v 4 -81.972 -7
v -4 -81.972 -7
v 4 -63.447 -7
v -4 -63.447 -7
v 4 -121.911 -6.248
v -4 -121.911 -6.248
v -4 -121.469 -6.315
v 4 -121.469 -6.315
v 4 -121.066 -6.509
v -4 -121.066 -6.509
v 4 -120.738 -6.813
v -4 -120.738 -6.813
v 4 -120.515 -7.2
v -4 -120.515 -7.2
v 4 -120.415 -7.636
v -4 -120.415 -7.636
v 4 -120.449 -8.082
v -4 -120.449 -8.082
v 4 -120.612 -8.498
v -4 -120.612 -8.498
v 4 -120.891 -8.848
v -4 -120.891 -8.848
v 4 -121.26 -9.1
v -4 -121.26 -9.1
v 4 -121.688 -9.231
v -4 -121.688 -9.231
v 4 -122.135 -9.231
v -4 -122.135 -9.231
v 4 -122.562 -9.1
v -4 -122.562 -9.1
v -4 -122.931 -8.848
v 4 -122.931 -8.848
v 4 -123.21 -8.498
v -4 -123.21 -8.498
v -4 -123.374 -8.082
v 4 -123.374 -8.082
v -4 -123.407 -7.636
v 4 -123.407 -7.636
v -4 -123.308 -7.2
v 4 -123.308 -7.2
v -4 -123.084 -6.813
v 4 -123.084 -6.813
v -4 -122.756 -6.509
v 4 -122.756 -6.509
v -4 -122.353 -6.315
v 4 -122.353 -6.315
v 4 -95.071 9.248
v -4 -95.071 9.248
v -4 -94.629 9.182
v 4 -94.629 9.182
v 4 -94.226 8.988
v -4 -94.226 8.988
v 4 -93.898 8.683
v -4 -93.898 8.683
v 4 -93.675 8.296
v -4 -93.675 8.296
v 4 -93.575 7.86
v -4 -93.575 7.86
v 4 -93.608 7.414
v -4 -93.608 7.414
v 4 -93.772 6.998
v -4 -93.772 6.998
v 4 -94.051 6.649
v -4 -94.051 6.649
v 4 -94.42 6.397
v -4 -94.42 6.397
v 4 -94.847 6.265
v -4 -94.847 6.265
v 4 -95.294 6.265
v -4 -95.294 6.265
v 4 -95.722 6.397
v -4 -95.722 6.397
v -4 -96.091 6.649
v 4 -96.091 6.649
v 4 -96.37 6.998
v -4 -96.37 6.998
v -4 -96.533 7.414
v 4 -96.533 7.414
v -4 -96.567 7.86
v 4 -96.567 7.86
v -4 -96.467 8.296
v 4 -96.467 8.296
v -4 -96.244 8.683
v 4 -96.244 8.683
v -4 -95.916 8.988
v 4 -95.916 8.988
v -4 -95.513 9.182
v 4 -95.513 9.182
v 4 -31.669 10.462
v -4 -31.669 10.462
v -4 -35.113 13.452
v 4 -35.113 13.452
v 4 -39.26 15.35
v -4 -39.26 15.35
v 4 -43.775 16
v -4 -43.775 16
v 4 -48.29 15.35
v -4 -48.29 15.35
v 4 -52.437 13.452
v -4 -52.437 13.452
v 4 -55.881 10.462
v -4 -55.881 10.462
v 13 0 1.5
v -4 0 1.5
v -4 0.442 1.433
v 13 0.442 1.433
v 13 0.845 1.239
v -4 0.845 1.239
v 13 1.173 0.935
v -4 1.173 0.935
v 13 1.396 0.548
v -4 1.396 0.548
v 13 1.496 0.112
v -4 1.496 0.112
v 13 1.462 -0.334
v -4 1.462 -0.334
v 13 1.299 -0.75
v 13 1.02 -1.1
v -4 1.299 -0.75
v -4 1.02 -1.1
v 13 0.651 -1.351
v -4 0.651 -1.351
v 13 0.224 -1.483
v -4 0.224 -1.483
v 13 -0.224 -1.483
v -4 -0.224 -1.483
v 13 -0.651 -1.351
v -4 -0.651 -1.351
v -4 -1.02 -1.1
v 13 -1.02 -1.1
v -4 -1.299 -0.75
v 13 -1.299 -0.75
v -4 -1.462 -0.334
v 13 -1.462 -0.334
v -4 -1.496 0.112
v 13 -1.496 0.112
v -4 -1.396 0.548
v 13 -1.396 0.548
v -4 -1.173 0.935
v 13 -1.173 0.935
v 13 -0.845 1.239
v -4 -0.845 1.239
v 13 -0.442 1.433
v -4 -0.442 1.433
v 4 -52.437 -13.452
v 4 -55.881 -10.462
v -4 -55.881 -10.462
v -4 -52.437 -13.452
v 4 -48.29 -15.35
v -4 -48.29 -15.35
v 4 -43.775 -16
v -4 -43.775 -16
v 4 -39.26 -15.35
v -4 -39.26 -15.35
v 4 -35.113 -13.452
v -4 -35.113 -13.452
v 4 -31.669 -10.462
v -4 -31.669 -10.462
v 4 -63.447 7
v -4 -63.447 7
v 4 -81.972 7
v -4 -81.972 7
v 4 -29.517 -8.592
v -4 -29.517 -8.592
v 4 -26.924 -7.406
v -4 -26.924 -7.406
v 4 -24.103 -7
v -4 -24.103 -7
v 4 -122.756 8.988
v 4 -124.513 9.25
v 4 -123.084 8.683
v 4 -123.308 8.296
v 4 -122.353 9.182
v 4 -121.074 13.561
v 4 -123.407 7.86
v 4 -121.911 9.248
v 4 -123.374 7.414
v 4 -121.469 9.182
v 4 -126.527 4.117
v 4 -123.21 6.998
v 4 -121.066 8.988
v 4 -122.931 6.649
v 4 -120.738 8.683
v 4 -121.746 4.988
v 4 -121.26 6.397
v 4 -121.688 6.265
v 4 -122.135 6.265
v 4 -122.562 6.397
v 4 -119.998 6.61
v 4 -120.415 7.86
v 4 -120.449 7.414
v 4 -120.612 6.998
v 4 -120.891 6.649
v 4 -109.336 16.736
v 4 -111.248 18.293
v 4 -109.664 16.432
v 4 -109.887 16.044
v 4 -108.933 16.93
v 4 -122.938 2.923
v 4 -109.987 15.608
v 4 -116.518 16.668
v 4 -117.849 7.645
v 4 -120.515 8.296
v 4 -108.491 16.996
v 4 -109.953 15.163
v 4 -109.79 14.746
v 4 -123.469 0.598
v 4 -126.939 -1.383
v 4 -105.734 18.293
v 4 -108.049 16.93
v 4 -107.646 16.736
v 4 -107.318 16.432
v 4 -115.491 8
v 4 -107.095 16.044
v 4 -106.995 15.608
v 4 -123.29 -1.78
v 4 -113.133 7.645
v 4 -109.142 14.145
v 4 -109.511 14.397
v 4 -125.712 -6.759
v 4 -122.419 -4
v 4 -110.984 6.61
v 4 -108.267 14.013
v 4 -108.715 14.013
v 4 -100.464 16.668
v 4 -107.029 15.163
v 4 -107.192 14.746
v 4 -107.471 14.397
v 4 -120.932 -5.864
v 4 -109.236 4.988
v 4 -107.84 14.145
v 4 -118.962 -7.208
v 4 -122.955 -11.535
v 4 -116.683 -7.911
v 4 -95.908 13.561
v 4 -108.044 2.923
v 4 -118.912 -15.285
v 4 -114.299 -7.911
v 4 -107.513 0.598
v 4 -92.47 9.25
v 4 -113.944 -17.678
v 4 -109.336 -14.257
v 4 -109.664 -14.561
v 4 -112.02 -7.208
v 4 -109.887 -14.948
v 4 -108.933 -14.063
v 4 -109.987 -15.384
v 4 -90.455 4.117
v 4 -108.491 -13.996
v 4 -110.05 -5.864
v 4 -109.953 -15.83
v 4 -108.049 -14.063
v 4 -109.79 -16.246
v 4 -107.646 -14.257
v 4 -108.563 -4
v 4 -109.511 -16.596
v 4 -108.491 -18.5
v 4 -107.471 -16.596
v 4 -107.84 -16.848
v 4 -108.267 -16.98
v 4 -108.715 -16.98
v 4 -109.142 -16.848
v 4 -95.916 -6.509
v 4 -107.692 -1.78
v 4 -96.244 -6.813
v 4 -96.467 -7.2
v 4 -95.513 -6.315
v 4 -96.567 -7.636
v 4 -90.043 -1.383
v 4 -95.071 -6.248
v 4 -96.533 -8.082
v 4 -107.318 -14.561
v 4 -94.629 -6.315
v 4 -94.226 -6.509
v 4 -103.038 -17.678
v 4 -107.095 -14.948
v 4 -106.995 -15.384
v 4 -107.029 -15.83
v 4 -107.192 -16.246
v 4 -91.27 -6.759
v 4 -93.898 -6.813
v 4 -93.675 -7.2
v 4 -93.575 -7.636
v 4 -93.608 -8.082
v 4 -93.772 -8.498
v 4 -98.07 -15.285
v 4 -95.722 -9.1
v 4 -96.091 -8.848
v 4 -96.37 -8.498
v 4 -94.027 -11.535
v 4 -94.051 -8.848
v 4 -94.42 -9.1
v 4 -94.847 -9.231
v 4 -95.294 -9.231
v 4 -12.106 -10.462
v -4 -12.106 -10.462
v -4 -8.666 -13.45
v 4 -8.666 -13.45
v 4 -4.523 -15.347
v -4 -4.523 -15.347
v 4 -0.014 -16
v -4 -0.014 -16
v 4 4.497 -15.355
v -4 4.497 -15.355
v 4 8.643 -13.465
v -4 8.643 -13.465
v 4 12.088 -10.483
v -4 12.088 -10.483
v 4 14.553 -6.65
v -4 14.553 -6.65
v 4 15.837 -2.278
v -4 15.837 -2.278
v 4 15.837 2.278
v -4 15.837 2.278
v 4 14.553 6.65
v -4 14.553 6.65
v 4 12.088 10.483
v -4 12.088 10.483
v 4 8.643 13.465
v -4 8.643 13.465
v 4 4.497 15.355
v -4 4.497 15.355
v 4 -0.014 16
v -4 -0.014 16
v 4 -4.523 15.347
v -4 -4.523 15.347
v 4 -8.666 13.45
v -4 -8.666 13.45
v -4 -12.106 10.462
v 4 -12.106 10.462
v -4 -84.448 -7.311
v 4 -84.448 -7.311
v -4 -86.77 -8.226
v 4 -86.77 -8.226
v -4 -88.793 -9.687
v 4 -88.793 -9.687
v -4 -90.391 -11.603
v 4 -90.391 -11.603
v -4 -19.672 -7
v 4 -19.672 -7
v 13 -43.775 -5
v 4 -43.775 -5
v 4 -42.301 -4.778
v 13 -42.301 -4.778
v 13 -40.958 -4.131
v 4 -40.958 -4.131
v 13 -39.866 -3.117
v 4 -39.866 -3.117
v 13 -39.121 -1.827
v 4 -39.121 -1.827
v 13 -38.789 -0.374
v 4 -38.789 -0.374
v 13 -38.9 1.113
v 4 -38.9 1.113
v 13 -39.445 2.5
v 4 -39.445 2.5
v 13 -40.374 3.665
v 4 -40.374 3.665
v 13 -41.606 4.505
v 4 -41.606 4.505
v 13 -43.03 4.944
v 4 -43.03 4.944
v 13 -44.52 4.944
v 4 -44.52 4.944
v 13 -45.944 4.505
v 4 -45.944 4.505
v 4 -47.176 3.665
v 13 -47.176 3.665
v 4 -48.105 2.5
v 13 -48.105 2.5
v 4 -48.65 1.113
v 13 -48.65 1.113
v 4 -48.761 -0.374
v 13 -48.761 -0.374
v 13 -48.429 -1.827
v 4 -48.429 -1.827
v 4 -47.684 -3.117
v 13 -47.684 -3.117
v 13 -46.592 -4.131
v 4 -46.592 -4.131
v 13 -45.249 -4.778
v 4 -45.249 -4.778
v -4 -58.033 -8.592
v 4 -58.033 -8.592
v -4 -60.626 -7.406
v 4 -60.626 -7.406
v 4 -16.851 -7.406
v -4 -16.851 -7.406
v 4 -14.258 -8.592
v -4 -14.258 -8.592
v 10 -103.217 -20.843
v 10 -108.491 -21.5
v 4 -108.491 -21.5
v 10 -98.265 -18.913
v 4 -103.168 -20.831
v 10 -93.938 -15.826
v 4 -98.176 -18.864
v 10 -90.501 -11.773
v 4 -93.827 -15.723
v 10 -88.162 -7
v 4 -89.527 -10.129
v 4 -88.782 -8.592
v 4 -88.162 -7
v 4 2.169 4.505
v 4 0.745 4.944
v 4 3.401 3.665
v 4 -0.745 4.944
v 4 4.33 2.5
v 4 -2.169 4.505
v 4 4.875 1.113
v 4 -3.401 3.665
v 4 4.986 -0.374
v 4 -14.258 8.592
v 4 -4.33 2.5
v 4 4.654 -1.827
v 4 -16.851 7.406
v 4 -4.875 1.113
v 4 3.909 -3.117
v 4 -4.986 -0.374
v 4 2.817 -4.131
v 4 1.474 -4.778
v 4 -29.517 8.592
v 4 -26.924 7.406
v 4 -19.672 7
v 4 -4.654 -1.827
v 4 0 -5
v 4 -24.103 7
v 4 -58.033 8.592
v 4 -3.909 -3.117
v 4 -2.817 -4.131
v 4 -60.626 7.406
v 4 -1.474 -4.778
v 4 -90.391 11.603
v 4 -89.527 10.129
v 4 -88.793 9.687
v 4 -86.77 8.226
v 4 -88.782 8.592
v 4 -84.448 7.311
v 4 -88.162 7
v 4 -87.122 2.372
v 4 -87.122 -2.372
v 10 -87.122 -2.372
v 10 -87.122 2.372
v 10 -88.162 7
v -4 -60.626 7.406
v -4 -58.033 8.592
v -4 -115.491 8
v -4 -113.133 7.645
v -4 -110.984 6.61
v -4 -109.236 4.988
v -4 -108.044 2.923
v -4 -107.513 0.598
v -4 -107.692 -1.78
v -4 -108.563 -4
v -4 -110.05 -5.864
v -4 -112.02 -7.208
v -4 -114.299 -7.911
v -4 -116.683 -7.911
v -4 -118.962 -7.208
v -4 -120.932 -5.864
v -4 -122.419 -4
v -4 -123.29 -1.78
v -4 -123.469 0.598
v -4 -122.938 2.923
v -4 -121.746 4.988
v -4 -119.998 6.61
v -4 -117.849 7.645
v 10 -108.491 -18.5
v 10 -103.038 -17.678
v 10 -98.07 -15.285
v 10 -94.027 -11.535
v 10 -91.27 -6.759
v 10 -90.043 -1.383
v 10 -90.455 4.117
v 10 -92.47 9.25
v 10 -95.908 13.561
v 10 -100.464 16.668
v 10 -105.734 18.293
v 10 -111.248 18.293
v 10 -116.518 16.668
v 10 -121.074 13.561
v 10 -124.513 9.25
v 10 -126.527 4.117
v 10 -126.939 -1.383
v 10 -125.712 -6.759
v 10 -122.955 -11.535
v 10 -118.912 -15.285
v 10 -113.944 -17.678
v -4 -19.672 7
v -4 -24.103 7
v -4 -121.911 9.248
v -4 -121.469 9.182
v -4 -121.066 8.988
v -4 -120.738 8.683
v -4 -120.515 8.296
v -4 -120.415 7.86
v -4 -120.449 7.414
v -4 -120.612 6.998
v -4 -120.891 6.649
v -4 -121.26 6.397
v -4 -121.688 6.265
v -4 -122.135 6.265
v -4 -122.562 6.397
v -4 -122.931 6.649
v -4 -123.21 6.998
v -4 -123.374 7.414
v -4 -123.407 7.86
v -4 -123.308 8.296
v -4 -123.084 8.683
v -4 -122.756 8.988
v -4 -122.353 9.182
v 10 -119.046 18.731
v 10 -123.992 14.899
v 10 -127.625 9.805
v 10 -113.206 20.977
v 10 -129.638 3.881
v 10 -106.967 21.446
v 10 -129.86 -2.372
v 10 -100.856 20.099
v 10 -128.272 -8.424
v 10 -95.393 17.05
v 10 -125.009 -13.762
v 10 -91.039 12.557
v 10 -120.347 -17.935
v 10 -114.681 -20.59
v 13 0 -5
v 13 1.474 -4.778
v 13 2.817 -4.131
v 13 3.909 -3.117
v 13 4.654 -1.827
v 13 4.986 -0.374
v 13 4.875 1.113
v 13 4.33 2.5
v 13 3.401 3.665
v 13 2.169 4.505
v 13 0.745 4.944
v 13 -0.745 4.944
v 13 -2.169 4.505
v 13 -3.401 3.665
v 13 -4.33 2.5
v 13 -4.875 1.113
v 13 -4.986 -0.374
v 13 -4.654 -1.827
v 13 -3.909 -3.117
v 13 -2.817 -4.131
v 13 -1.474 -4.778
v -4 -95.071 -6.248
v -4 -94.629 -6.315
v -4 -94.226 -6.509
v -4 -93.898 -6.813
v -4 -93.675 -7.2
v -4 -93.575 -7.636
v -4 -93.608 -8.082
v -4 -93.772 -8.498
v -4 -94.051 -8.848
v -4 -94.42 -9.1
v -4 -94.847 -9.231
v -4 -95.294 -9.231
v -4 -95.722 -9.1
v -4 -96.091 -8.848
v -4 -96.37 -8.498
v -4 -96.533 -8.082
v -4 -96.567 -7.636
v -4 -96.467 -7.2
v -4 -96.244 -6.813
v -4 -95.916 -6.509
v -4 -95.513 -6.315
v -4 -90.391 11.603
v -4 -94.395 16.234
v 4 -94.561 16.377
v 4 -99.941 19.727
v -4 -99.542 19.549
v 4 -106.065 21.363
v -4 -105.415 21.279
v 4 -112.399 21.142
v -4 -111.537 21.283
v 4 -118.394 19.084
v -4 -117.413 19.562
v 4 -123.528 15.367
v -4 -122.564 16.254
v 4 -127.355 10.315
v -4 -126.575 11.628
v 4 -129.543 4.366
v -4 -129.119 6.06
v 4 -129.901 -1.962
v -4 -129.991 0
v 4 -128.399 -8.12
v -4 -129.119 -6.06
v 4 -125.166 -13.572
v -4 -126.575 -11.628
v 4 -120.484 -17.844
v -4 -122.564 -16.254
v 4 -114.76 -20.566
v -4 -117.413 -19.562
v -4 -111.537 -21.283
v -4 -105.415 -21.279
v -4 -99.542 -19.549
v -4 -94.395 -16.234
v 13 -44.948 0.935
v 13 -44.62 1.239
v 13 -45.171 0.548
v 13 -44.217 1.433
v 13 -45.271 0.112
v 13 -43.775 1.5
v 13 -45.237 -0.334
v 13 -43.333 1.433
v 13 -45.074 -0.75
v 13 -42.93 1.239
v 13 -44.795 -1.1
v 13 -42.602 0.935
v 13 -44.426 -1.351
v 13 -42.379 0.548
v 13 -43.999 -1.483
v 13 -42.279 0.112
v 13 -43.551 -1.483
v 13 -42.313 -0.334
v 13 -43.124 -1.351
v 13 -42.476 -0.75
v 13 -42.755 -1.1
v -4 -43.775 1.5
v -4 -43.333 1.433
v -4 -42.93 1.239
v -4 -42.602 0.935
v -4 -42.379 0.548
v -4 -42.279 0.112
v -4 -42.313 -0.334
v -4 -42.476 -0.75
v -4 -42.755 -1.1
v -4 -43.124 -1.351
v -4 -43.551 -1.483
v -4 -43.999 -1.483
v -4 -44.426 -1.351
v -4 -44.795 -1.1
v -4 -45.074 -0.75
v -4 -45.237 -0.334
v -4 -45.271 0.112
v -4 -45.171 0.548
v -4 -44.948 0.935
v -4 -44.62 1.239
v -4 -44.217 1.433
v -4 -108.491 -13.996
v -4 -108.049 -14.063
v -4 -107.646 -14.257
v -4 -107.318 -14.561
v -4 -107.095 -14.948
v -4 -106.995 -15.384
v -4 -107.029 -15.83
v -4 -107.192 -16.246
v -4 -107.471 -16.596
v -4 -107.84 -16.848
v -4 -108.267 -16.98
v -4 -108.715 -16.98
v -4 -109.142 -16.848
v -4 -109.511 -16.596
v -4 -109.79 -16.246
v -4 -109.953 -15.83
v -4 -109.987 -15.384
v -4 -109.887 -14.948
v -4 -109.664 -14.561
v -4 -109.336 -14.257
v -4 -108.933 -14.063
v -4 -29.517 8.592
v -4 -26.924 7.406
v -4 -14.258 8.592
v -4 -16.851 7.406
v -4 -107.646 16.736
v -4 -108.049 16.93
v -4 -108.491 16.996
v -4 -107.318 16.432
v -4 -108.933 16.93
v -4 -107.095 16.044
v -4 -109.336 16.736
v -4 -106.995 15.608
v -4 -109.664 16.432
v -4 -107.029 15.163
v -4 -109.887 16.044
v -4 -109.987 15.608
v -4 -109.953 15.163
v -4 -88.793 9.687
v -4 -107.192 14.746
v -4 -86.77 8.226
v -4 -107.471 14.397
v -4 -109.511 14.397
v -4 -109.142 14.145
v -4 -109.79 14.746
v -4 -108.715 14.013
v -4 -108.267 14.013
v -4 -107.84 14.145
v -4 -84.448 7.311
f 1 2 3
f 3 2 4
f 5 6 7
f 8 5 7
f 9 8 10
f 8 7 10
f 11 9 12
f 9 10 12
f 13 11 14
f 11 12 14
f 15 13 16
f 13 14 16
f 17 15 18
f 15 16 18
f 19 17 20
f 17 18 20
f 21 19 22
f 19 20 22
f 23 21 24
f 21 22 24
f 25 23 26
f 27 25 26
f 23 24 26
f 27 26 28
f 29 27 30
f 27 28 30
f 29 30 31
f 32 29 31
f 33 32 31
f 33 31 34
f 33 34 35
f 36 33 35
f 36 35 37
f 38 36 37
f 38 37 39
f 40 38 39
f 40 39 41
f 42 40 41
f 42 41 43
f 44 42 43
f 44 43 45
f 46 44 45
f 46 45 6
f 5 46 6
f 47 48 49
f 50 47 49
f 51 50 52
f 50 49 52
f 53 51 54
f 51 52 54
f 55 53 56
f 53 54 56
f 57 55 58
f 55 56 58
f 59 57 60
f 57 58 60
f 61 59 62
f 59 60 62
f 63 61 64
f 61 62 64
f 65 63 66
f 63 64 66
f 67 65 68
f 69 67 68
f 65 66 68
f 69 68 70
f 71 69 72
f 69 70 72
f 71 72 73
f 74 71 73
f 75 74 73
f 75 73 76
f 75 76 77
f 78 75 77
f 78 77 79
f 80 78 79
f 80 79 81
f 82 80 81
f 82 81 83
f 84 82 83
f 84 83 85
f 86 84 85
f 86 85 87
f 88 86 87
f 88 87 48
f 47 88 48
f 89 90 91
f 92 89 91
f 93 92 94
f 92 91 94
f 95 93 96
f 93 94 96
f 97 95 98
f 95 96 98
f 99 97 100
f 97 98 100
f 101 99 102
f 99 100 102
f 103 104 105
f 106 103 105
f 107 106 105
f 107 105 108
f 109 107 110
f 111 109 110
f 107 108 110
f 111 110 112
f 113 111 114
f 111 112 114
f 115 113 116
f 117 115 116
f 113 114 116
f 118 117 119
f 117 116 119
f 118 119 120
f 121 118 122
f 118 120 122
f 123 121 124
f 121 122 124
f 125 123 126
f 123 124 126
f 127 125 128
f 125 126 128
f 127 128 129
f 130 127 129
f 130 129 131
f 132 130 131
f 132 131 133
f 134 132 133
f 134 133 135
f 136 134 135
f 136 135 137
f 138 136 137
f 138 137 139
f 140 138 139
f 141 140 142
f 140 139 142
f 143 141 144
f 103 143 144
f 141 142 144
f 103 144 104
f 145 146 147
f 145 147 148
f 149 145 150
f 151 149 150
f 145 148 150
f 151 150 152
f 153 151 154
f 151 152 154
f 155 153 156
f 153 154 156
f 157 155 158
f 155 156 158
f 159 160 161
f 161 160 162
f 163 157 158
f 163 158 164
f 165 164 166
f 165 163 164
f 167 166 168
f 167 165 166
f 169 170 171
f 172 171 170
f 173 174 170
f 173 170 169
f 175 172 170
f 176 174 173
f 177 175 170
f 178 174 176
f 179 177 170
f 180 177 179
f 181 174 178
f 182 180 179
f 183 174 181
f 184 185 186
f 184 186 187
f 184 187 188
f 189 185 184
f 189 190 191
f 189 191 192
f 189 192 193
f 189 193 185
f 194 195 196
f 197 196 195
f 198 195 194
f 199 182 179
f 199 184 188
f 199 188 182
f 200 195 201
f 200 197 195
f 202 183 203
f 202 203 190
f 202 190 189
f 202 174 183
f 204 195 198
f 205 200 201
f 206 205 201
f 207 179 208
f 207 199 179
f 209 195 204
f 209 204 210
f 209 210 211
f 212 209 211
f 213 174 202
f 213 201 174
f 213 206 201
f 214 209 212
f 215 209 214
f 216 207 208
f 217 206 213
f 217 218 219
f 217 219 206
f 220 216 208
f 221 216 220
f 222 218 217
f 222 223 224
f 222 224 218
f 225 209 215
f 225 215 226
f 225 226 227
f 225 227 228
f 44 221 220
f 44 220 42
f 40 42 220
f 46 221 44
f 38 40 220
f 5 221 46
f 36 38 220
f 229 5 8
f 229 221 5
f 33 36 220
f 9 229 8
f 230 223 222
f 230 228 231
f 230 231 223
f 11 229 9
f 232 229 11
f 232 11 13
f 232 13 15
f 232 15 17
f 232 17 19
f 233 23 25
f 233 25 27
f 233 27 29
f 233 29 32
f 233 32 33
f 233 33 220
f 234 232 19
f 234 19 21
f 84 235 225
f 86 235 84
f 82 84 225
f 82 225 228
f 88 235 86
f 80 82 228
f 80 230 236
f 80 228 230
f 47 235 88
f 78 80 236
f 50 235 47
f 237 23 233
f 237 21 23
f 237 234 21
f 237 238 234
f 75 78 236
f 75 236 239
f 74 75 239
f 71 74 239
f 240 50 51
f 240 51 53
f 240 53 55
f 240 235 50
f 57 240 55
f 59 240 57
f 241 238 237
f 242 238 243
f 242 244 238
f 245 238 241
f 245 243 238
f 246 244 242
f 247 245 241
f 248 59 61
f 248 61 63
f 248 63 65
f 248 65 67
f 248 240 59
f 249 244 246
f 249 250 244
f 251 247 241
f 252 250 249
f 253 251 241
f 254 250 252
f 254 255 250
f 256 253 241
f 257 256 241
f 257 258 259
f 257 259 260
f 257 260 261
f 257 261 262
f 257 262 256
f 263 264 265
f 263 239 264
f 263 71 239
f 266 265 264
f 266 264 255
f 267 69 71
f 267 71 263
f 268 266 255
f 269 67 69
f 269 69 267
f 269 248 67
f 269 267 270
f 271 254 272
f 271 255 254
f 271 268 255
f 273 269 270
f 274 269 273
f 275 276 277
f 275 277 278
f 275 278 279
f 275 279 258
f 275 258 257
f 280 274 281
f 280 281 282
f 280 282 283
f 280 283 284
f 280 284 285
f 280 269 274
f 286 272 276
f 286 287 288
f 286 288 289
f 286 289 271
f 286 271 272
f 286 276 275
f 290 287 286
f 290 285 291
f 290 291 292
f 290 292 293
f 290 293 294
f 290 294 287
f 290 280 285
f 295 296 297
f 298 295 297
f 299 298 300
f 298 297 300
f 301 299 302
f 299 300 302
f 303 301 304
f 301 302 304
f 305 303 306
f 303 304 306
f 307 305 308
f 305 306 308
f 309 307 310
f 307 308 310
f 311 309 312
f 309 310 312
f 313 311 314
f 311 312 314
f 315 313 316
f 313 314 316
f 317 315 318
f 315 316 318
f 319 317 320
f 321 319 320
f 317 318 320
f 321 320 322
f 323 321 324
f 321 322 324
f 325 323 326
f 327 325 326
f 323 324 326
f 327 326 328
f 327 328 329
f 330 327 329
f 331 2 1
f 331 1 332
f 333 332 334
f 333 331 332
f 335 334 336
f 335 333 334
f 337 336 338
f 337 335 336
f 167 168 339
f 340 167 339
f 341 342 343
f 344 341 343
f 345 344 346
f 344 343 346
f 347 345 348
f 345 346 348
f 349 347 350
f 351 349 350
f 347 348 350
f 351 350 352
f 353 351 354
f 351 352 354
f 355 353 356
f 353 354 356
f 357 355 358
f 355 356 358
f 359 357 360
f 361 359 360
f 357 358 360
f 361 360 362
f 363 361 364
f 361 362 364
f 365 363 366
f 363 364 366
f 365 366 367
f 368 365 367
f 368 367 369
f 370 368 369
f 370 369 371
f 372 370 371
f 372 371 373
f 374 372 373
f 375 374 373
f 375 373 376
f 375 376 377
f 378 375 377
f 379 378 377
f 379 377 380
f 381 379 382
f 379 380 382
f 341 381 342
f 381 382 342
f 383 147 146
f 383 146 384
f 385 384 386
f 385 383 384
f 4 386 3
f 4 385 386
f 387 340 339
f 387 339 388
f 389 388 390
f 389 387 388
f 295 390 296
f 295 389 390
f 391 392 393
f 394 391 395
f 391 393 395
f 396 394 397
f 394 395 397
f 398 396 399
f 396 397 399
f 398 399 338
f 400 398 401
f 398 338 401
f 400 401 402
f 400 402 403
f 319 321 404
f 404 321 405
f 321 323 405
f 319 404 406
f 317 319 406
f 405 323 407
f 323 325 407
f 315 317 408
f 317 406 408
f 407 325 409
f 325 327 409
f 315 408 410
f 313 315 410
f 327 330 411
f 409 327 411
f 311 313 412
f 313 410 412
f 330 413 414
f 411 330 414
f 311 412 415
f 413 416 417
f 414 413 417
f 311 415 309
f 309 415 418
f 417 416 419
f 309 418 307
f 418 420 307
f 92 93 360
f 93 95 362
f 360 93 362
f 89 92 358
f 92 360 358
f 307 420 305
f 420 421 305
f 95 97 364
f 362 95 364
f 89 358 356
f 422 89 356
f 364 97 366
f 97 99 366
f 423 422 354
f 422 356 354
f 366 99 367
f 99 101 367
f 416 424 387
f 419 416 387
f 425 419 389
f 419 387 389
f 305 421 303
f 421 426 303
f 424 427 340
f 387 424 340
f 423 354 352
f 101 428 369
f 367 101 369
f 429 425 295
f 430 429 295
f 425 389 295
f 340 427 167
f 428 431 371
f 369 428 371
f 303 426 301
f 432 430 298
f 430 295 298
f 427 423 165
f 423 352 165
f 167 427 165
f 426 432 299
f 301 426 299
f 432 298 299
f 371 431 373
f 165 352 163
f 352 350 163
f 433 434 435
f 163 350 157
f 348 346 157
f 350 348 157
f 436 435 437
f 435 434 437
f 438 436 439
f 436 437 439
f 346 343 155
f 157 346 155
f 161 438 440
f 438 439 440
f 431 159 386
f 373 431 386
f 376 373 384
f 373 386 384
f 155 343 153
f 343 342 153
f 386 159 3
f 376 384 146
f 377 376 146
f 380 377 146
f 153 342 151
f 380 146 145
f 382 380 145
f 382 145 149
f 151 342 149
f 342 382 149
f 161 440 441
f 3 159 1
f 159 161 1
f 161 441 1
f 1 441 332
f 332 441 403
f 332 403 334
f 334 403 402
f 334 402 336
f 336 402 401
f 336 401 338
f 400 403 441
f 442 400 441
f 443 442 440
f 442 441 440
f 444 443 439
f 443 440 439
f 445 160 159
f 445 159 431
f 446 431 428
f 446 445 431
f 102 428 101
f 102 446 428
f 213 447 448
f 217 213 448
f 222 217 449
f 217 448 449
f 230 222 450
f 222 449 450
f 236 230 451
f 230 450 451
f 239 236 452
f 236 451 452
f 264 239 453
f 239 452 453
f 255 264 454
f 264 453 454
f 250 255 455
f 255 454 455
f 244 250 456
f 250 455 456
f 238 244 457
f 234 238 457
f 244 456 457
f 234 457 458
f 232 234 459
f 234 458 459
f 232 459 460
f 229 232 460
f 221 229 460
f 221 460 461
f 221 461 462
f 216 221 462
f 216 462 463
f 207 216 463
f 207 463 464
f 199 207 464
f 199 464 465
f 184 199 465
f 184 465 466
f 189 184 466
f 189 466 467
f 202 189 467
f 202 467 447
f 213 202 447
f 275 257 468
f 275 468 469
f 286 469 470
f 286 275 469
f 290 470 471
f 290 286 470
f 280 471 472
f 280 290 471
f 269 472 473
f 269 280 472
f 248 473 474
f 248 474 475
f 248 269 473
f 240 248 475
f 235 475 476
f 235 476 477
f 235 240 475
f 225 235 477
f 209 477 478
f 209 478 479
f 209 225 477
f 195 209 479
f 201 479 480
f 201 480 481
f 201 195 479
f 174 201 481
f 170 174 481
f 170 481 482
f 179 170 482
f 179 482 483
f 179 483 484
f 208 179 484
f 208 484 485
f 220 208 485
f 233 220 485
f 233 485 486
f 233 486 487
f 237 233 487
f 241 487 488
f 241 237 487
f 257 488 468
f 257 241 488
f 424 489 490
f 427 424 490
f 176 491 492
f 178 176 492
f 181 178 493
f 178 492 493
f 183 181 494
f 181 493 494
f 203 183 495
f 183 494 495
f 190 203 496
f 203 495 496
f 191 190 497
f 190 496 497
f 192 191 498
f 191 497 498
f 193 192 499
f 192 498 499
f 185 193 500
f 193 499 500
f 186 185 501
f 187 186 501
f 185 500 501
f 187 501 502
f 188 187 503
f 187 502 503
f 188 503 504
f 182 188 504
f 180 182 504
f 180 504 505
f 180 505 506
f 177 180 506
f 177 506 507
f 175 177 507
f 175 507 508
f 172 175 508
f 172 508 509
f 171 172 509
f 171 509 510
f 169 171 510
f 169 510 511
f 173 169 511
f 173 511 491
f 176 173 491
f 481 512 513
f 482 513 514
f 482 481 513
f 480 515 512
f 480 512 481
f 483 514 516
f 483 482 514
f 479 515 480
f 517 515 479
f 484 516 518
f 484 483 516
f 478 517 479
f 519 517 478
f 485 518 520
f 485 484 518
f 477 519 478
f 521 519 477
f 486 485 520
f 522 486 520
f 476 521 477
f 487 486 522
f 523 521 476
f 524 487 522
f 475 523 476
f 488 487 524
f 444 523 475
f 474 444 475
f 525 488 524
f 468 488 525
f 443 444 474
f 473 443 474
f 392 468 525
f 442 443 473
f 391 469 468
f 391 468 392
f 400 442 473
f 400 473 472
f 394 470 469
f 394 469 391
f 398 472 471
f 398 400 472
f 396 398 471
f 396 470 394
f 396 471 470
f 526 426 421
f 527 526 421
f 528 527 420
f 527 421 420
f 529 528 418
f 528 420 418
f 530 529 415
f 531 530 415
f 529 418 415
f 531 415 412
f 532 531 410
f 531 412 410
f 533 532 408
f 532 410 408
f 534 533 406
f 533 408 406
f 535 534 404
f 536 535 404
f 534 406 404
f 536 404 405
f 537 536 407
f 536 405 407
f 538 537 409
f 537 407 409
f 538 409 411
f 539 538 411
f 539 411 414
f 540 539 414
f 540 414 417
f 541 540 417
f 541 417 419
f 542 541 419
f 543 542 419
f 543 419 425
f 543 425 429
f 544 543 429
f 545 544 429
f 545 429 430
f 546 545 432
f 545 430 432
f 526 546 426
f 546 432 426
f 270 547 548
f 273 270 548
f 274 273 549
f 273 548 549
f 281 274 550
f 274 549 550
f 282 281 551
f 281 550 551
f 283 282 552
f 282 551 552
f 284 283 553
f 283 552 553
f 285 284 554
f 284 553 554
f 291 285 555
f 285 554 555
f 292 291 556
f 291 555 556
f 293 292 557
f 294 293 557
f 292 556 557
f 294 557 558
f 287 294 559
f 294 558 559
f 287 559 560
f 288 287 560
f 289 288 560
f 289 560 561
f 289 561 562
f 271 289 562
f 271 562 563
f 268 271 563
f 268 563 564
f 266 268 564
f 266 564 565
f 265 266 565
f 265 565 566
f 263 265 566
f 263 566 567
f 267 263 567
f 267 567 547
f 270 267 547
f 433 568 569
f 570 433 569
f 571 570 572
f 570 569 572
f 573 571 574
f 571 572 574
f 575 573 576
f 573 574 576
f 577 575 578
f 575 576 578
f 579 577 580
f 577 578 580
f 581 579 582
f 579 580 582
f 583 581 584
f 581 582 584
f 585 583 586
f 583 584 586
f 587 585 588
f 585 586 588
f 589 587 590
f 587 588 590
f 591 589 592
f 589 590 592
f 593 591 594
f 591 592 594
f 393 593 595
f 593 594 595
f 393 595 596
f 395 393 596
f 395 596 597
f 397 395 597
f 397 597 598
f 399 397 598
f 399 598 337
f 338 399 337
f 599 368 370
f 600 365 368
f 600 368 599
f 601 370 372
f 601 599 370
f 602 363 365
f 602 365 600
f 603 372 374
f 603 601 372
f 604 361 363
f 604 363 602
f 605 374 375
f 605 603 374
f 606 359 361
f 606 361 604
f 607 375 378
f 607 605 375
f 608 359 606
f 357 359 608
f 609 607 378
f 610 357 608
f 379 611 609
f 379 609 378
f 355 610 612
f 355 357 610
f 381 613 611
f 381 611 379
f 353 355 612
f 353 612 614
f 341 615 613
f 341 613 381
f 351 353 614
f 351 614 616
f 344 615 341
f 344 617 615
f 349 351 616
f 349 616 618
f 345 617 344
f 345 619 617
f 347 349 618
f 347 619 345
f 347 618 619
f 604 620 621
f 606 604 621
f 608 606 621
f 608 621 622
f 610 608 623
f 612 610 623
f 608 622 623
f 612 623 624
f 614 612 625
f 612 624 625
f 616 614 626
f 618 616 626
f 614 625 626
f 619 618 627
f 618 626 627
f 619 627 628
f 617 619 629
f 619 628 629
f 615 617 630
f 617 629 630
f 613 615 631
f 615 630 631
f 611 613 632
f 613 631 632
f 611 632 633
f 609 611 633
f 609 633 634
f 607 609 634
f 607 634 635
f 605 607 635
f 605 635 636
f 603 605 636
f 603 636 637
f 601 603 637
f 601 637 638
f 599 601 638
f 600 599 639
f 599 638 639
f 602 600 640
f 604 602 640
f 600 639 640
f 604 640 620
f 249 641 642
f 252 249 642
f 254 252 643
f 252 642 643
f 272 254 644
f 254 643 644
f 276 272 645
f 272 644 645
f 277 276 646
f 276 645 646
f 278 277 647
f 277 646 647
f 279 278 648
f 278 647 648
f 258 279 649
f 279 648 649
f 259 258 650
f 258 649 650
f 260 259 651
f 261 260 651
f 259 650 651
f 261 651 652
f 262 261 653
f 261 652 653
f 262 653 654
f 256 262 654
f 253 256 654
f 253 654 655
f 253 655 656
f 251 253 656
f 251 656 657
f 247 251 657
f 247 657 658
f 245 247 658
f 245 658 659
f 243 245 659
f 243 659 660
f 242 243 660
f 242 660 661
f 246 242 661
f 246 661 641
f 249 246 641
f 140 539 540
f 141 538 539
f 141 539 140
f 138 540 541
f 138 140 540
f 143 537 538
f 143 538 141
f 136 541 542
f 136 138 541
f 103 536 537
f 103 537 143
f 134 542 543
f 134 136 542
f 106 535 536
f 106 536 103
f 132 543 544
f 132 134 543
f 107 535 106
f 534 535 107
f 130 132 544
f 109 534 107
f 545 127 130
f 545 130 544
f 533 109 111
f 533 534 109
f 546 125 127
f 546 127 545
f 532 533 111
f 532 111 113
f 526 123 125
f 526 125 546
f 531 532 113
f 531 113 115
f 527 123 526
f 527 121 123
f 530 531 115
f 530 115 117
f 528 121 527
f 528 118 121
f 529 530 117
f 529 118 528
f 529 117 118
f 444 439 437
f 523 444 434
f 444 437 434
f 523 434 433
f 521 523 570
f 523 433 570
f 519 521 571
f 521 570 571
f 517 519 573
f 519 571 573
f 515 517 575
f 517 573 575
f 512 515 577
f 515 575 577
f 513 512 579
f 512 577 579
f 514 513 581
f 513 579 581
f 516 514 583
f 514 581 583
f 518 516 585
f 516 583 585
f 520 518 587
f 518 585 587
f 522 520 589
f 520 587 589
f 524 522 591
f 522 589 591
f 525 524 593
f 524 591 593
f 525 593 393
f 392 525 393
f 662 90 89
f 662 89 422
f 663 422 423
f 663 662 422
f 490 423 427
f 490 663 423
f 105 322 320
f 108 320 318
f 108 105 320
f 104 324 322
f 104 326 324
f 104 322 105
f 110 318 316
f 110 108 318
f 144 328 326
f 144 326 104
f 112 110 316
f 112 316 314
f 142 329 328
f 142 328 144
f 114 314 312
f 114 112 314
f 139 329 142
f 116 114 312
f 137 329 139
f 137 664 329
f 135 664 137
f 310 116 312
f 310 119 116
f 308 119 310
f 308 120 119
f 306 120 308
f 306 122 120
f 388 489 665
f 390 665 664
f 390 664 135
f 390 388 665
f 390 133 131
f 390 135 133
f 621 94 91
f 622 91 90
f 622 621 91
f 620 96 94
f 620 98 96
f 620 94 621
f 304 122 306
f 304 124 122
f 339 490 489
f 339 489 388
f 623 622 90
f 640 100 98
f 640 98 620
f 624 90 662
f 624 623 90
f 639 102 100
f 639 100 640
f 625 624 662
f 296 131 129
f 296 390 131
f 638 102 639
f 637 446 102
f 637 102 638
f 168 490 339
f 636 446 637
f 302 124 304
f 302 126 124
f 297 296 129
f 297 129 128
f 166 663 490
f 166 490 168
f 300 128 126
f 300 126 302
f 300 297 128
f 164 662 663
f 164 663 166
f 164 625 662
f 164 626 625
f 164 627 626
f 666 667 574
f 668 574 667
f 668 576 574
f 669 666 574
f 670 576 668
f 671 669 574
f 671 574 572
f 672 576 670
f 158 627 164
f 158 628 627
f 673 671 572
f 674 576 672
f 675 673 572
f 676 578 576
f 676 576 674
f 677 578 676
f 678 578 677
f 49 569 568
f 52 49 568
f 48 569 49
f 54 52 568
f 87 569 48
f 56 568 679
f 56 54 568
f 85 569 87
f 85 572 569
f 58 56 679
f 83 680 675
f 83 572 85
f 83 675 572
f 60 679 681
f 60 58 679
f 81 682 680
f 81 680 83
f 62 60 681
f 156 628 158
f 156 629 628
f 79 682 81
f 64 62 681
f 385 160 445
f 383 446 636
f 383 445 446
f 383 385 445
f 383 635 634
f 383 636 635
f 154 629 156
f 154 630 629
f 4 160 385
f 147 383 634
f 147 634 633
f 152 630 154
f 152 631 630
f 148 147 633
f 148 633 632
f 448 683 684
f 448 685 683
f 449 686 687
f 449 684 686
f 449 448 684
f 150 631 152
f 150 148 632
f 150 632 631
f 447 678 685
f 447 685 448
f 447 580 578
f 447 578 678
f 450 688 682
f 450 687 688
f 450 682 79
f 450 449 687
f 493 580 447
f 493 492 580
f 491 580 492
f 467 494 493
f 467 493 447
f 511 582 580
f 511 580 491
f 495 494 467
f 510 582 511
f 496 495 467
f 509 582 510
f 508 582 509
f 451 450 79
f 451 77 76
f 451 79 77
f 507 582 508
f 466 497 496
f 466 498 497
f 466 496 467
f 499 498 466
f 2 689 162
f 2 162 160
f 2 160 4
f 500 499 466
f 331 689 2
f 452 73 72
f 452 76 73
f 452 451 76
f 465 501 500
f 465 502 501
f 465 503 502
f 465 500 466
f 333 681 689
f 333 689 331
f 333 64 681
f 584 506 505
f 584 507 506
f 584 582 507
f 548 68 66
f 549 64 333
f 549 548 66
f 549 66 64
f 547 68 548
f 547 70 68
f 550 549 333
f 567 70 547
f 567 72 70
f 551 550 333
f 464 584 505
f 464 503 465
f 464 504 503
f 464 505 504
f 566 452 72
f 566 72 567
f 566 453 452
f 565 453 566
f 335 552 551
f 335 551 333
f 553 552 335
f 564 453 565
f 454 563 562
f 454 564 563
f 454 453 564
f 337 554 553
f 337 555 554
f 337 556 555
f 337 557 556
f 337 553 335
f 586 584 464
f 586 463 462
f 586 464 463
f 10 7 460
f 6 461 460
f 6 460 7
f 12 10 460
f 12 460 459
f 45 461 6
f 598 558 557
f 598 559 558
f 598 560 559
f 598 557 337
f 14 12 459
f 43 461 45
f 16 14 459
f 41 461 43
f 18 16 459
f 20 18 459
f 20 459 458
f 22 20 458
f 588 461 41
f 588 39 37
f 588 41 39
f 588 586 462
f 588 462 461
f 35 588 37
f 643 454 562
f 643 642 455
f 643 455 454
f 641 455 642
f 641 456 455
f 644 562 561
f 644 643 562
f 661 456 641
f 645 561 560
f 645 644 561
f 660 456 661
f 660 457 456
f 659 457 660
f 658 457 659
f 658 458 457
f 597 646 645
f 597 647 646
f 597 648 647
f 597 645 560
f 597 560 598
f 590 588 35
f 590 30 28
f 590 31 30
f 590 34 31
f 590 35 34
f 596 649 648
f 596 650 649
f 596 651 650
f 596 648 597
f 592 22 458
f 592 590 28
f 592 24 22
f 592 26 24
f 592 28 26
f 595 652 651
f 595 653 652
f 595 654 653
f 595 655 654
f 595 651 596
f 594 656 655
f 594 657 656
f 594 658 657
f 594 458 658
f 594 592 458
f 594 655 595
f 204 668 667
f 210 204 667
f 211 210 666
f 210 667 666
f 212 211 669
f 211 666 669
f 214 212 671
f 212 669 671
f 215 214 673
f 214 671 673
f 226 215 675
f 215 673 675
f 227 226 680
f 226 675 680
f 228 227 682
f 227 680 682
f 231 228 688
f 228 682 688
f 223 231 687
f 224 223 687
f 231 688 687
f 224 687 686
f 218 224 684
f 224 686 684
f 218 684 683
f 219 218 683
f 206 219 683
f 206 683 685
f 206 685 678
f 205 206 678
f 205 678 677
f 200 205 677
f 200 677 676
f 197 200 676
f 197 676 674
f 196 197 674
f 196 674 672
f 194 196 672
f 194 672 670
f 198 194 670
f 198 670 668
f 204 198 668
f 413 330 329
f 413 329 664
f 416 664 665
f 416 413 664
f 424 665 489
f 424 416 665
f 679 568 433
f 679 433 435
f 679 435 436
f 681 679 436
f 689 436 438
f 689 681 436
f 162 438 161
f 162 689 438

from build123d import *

# Parameters (mm, degrees)
BOSS_EXTRUDE1_DEPTH      = 4
BOSS_EXTRUDE1_DEPTH_BACK = 4
BOSS_EXTRUDE2_START      = 4
SKETCH1_3_R              = 5
BOSS_EXTRUDE2_DEPTH      = 9
SKETCH2_R                = 1.5
CUT_EXTRUDE1_DEPTH       = 17
SKETCH3_R                = 18.5
BOSS_EXTRUDE3_DEPTH      = 6
SKETCH4_R                = 8
SKETCH4_R_2              = 1.5
CUT_EXTRUDE2_DEPTH       = 14
FILLET1_R                = 10


with BuildPart() as part:
    # Sketch1 → Boss-Extrude1 (new, two sides: drawn at the far end of the back side and taken through both)
    with BuildSketch(Plane(origin=(0, 0, 0), x_dir=(0, 0, -1), z_dir=(1, 0, 0)).offset(-BOSS_EXTRUDE1_DEPTH_BACK)):
        with BuildLine():
            Line((-7, -14.38749457), (-7, -29.38749457))
            ThreePointArc((-7, -29.38749457), (-16, -43.77498914), (-7, -58.16248371))
            Line((-7, -58.16248371), (-7, -88.16248371))
            ThreePointArc((-7, -88.16248371), (0, -129.99103506), (7, -88.16248371))
            Line((7, -88.16248371), (7, -58.16248371))
            ThreePointArc((7, -58.16248371), (16, -43.77498914), (7, -29.38749457))
            Line((7, -29.38749457), (7, -14.38749457))
            ThreePointArc((7, -14.38749457), (0, 16), (-7, -14.38749457))
        make_face()
    extrude(amount=BOSS_EXTRUDE1_DEPTH + BOSS_EXTRUDE1_DEPTH_BACK)

    # Sketch1<3> → Boss-Extrude2 (add)
    with BuildSketch(Plane(origin=(0, 0, 0), x_dir=(0, 0, -1), z_dir=(1, 0, 0)).offset(BOSS_EXTRUDE2_START)):
        Circle(SKETCH1_3_R)
        with Locations((0, -43.77498914)):
            Circle(SKETCH1_3_R)
    extrude(amount=BOSS_EXTRUDE2_DEPTH)

    # Sketch2 → Cut-Extrude1 (cut)
    with BuildSketch(Plane.ZY.offset(4)):
        Circle(SKETCH2_R)
        with Locations((0, -43.77498914)):
            Circle(SKETCH2_R)
    extrude(amount=-CUT_EXTRUDE1_DEPTH, mode=Mode.SUBTRACT)

    # Sketch3 → Boss-Extrude3 (add)
    with BuildSketch(Plane(origin=(4, 0, 0), x_dir=(0, 0, -1), z_dir=(1, 0, 0))):
        with BuildLine():
            ThreePointArc((-7, -88.16248371), (-12.484990989, -125.994606124), (21.5, -108.49103506))
            ThreePointArc((21.5, -108.49103506), (17.503571064, -96.006044071), (7, -88.16248371))
            ThreePointArc((7, -88.16248371), (0, -86.99103506), (-7, -88.16248371))
        make_face()
        with Locations((0, -108.49103506)):
            Circle(SKETCH3_R, mode=Mode.SUBTRACT)
    extrude(amount=BOSS_EXTRUDE3_DEPTH)

    # Sketch4 → Cut-Extrude2 (cut)
    with BuildSketch(Plane.ZY.offset(4)):
        with Locations((0, -115.49103506)):
            Circle(SKETCH4_R)
        with Locations((15.496292799, -108.49103506)):
            Circle(SKETCH4_R_2)
        with Locations((7.7481464, -95.070851831)):
            Circle(SKETCH4_R_2)
        with Locations((-7.7481464, -95.070851831)):
            Circle(SKETCH4_R_2)
        with Locations((-15.496292799, -108.49103506)):
            Circle(SKETCH4_R_2)
        with Locations((-7.7481464, -121.911218289)):
            Circle(SKETCH4_R_2)
        with Locations((7.7481464, -121.911218289)):
            Circle(SKETCH4_R_2)
    extrude(amount=-CUT_EXTRUDE2_DEPTH, mode=Mode.SUBTRACT)

    # Fillet1
    # the kernel refuses this fillet: 10 mm, written as the material it adds along each edge
    with BuildSketch(Plane(origin=(-4, -29.38749457, 7), x_dir=(0, 1, 0), z_dir=(1, 0, 0)), Plane(origin=(4, -14.38749457, 7), x_dir=(0, -1, 0), z_dir=(-1, 0, 0)), Plane(origin=(4, -29.38749457, -7), x_dir=(0, 1, 0), z_dir=(-1, 0, 0))) as fillet1_piece_1:
        with BuildLine():
            CenterArc((5.284821003, 10), FILLET1_R, 220.832217027, 49.167782973)
            ThreePointArc((-2.281454217, 3.461538462), (-1.028137912, 1.804975281), (0, 0))
            Line((0, 0), (5.284821003, 0))
        make_face()
    extrude(amount=8)
    with BuildSketch(Plane(origin=(4, -14.38749457, -7), x_dir=(0, 0.5503109550569161, -0.8349597910943646), z_dir=(-1, 0, 0)), Plane(origin=(-4, -58.16248371, 7), x_dir=(0, 0.5503109550569153, 0.8349597910943651), z_dir=(1, 0, 0))) as fillet1_piece_2:
        with BuildLine():
            CenterArc((5.441303017, 9.915722591), FILLET1_R, 213.3883484, 49.167782973)
            Line((-2.908294893, 4.412613041), (0, 0))
            ThreePointArc((0, 0), (2.07287734, 0.134843854), (4.14575468, 0))
        make_face()
    extrude(amount=8)
    with BuildSketch(Plane(origin=(-4, -58.16248371, -7), x_dir=(0, 0.5503109550569155, -0.834959791094365), z_dir=(1, 0, 0))) as fillet1_piece_3:
        with BuildLine():
            CenterArc((5.441303017, -9.915722591), FILLET1_R, 97.443868628, 49.167782973)
            Line((-2.908294893, -4.412613041), (0, 0))
            ThreePointArc((0, 0), (2.07287734, -0.134843854), (4.14575468, 0))
        make_face()
    extrude(amount=8)
    with BuildSketch(Plane(origin=(-4, -88.16248371, -7), x_dir=(0, 1, 0), z_dir=(1, 0, 0))) as fillet1_piece_4:
        with BuildLine():
            CenterArc((6.190309862, -10), FILLET1_R, 90, 57.337969437)
            ThreePointArc((-2.228376237, -4.603174603), (-0.976831569, -2.368080993), (0, 0))
            Line((0, 0), (6.190309862, 0))
        make_face()
    extrude(amount=8)
    with BuildSketch(Plane(origin=(-4, -88.16248371, 7), x_dir=(0, -0.43572469735161884, 0.9000799898441472), z_dir=(1, 0, 0))) as fillet1_piece_5:
        with BuildLine():
            CenterArc((6.303529007, -9.929021011), FILLET1_R, 96.8306141, 57.337969437)
            Line((-2.697270891, -5.571774038), (0, 0))
            ThreePointArc((0, 0), (2.557091956, -0.152604826), (5.114183912, 0))
        make_face()
    extrude(amount=8)


solid = part.part
